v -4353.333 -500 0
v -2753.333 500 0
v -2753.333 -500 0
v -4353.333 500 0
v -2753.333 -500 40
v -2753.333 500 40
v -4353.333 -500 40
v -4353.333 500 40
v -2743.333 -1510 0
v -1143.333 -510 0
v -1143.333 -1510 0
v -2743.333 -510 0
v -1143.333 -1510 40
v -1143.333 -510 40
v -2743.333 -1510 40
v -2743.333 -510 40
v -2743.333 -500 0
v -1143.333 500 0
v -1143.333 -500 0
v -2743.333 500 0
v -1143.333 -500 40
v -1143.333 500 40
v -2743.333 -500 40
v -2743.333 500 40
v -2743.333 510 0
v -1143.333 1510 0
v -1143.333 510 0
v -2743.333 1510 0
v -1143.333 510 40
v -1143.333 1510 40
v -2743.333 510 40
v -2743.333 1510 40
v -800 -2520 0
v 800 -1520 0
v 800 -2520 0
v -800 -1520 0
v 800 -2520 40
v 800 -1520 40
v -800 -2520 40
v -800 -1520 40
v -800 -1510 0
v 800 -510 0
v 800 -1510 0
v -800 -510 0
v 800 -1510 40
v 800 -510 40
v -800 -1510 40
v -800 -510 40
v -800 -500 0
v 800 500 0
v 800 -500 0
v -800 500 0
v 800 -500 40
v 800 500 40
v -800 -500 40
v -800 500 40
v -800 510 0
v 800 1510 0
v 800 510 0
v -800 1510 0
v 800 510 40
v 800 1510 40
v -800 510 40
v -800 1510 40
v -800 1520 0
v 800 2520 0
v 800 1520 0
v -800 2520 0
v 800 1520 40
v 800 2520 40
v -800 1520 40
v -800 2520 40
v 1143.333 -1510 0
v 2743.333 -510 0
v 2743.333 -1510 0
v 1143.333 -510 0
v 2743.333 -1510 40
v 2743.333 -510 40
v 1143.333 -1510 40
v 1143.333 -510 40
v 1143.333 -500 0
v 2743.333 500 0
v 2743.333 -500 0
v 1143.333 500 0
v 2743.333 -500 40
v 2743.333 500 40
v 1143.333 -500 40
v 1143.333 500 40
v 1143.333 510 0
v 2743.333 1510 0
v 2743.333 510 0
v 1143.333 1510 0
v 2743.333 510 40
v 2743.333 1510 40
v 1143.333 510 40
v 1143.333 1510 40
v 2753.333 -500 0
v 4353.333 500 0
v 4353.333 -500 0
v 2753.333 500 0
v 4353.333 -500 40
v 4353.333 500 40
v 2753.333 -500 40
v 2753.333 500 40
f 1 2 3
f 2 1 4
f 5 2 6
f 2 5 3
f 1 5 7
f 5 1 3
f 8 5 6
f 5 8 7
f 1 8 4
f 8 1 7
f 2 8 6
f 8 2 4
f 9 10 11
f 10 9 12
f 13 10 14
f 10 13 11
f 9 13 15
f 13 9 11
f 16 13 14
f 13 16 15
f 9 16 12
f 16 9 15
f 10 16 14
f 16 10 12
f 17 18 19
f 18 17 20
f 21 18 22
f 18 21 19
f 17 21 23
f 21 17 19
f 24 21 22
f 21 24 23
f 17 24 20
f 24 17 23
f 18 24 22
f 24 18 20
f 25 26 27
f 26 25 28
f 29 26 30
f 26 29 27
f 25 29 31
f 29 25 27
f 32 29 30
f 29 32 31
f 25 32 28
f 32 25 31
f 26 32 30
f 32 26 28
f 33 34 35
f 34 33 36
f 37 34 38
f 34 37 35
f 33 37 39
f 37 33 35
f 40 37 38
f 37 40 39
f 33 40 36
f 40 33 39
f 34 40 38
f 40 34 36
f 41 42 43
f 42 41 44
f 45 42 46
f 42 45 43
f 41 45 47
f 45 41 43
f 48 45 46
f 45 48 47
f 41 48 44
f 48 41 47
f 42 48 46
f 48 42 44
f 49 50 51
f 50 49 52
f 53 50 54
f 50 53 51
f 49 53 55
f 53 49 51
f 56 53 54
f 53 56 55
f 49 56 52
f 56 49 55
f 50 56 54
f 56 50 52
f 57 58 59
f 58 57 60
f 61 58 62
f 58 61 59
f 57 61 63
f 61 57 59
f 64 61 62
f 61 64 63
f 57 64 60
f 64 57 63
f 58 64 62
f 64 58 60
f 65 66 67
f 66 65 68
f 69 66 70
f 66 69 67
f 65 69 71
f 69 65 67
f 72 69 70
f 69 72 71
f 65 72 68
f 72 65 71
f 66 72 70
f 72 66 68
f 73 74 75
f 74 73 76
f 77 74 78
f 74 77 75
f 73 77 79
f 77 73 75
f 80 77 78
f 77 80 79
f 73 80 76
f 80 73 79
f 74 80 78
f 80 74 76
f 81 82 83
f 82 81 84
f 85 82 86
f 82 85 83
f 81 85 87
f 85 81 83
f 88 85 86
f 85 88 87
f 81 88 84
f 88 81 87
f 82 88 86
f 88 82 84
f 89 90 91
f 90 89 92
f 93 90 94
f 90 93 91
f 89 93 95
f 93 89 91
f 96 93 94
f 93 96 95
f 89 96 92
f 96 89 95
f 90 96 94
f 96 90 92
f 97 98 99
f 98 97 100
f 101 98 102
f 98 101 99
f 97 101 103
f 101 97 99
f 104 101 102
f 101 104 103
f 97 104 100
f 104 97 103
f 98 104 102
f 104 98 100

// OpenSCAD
// Generated by Parametrix
ca_surface_faceSurface_000 = [ [ -4353.3333, -500.0000 ],[ -2753.3333, -500.0000 ],[ -2753.3333, 500.0000 ],[ -4353.3333, 500.0000 ],[ -4353.3333, -500.0000 ] ];
cb_surface_faceSurface_000 = [  0, 1, 2, 3, 4 ];
ca_surface_faceSurface_001 = [ [ -2743.3333, -1510.0000 ],[ -1143.3333, -1510.0000 ],[ -1143.3333, -510.0000 ],[ -2743.3333, -510.0000 ],[ -2743.3333, -1510.0000 ] ];
cb_surface_faceSurface_001 = [  5, 6, 7, 8, 9 ];
ca_surface_faceSurface_002 = [ [ -2743.3333, -500.0000 ],[ -1143.3333, -500.0000 ],[ -1143.3333, 500.0000 ],[ -2743.3333, 500.0000 ],[ -2743.3333, -500.0000 ] ];
cb_surface_faceSurface_002 = [  10, 11, 12, 13, 14 ];
ca_surface_faceSurface_003 = [ [ -2743.3333, 510.0000 ],[ -1143.3333, 510.0000 ],[ -1143.3333, 1510.0000 ],[ -2743.3333, 1510.0000 ],[ -2743.3333, 510.0000 ] ];
cb_surface_faceSurface_003 = [  15, 16, 17, 18, 19 ];
ca_surface_faceSurface_004 = [ [ -800.0000, -2520.0000 ],[ 800.0000, -2520.0000 ],[ 800.0000, -1520.0000 ],[ -800.0000, -1520.0000 ],[ -800.0000, -2520.0000 ] ];
cb_surface_faceSurface_004 = [  20, 21, 22, 23, 24 ];
ca_surface_faceSurface_005 = [ [ -800.0000, -1510.0000 ],[ 800.0000, -1510.0000 ],[ 800.0000, -510.0000 ],[ -800.0000, -510.0000 ],[ -800.0000, -1510.0000 ] ];
cb_surface_faceSurface_005 = [  25, 26, 27, 28, 29 ];
ca_surface_faceSurface_006 = [ [ -800.0000, -500.0000 ],[ 800.0000, -500.0000 ],[ 800.0000, 500.0000 ],[ -800.0000, 500.0000 ],[ -800.0000, -500.0000 ] ];
cb_surface_faceSurface_006 = [  30, 31, 32, 33, 34 ];
ca_surface_faceSurface_007 = [ [ -800.0000, 510.0000 ],[ 800.0000, 510.0000 ],[ 800.0000, 1510.0000 ],[ -800.0000, 1510.0000 ],[ -800.0000, 510.0000 ] ];
cb_surface_faceSurface_007 = [  35, 36, 37, 38, 39 ];
ca_surface_faceSurface_008 = [ [ -800.0000, 1520.0000 ],[ 800.0000, 1520.0000 ],[ 800.0000, 2520.0000 ],[ -800.0000, 2520.0000 ],[ -800.0000, 1520.0000 ] ];
cb_surface_faceSurface_008 = [  40, 41, 42, 43, 44 ];
ca_surface_faceSurface_009 = [ [ 1143.3333, -1510.0000 ],[ 2743.3333, -1510.0000 ],[ 2743.3333, -510.0000 ],[ 1143.3333, -510.0000 ],[ 1143.3333, -1510.0000 ] ];
cb_surface_faceSurface_009 = [  45, 46, 47, 48, 49 ];
ca_surface_faceSurface_010 = [ [ 1143.3333, -500.0000 ],[ 2743.3333, -500.0000 ],[ 2743.3333, 500.0000 ],[ 1143.3333, 500.0000 ],[ 1143.3333, -500.0000 ] ];
cb_surface_faceSurface_010 = [  50, 51, 52, 53, 54 ];
ca_surface_faceSurface_011 = [ [ 1143.3333, 510.0000 ],[ 2743.3333, 510.0000 ],[ 2743.3333, 1510.0000 ],[ 1143.3333, 1510.0000 ],[ 1143.3333, 510.0000 ] ];
cb_surface_faceSurface_011 = [  55, 56, 57, 58, 59 ];
ca_surface_faceSurface_012 = [ [ 2753.3333, -500.0000 ],[ 4353.3333, -500.0000 ],[ 4353.3333, 500.0000 ],[ 2753.3333, 500.0000 ],[ 2753.3333, -500.0000 ] ];
cb_surface_faceSurface_012 = [  60, 61, 62, 63, 64 ];
a_surface_faceSurface = concat(ca_surface_faceSurface_000, ca_surface_faceSurface_001, ca_surface_faceSurface_002, ca_surface_faceSurface_003, ca_surface_faceSurface_004, ca_surface_faceSurface_005, ca_surface_faceSurface_006, ca_surface_faceSurface_007, ca_surface_faceSurface_008, ca_surface_faceSurface_009, ca_surface_faceSurface_010, ca_surface_faceSurface_011, ca_surface_faceSurface_012);
b_surface_faceSurface = [cb_surface_faceSurface_000, cb_surface_faceSurface_001, cb_surface_faceSurface_002, cb_surface_faceSurface_003, cb_surface_faceSurface_004, cb_surface_faceSurface_005, cb_surface_faceSurface_006, cb_surface_faceSurface_007, cb_surface_faceSurface_008, cb_surface_faceSurface_009, cb_surface_faceSurface_010, cb_surface_faceSurface_011, cb_surface_faceSurface_012];
ca_surface_faceOnePanel_000 = [ [ 0.0000, 0.0000 ],[ 1600.0000, 0.0000 ],[ 1600.0000, 1000.0000 ],[ 0.0000, 1000.0000 ],[ 0.0000, 0.0000 ] ];
cb_surface_faceOnePanel_000 = [  0, 1, 2, 3, 4 ];
a_surface_faceOnePanel = concat(ca_surface_faceOnePanel_000);
b_surface_faceOnePanel = [cb_surface_faceOnePanel_000];

module subpax_surface_panel_0 () {
	translate( [ -4353.333333333333, -500, 0 ])
		rotate( [ 0, 0, 0 ])
			   linear_extrude(height = 40) polygon(a_surface_faceOnePanel, b_surface_faceOnePanel);
}

module subpax_surface_panel_1 () {
	translate( [ -2743.333333333333, -1510, 0 ])
		rotate( [ 0, 0, 0 ])
			   linear_extrude(height = 40) polygon(a_surface_faceOnePanel, b_surface_faceOnePanel);
}

module subpax_surface_panel_2 () {
	translate( [ -2743.333333333333, -500, 0 ])
		rotate( [ 0, 0, 0 ])
			   linear_extrude(height = 40) polygon(a_surface_faceOnePanel, b_surface_faceOnePanel);
}

module subpax_surface_panel_3 () {
	translate( [ -2743.333333333333, 510, 0 ])
		rotate( [ 0, 0, 0 ])
			   linear_extrude(height = 40) polygon(a_surface_faceOnePanel, b_surface_faceOnePanel);
}

module subpax_surface_panel_4 () {
	translate( [ -799.9999999999998, -2520, 0 ])
		rotate( [ 0, 0, 0 ])
			   linear_extrude(height = 40) polygon(a_surface_faceOnePanel, b_surface_faceOnePanel);
}

module subpax_surface_panel_5 () {
	translate( [ -799.9999999999998, -1510, 0 ])
		rotate( [ 0, 0, 0 ])
			   linear_extrude(height = 40) polygon(a_surface_faceOnePanel, b_surface_faceOnePanel);
}

module subpax_surface_panel_6 () {
	translate( [ -799.9999999999998, -500, 0 ])
		rotate( [ 0, 0, 0 ])
			   linear_extrude(height = 40) polygon(a_surface_faceOnePanel, b_surface_faceOnePanel);
}

module subpax_surface_panel_7 () {
	translate( [ -799.9999999999998, 510, 0 ])
		rotate( [ 0, 0, 0 ])
			   linear_extrude(height = 40) polygon(a_surface_faceOnePanel, b_surface_faceOnePanel);
}

module subpax_surface_panel_8 () {
	translate( [ -799.9999999999998, 1520, 0 ])
		rotate( [ 0, 0, 0 ])
			   linear_extrude(height = 40) polygon(a_surface_faceOnePanel, b_surface_faceOnePanel);
}

module subpax_surface_panel_9 () {
	translate( [ 1143.3333333333337, -1510, 0 ])
		rotate( [ 0, 0, 0 ])
			   linear_extrude(height = 40) polygon(a_surface_faceOnePanel, b_surface_faceOnePanel);
}

module subpax_surface_panel_10 () {
	translate( [ 1143.3333333333337, -500, 0 ])
		rotate( [ 0, 0, 0 ])
			   linear_extrude(height = 40) polygon(a_surface_faceOnePanel, b_surface_faceOnePanel);
}

module subpax_surface_panel_11 () {
	translate( [ 1143.3333333333337, 510, 0 ])
		rotate( [ 0, 0, 0 ])
			   linear_extrude(height = 40) polygon(a_surface_faceOnePanel, b_surface_faceOnePanel);
}

module subpax_surface_panel_12 () {
	translate( [ 2753.333333333334, -500, 0 ])
		rotate( [ 0, 0, 0 ])
			   linear_extrude(height = 40) polygon(a_surface_faceOnePanel, b_surface_faceOnePanel);
}

module pax_surface () {
	union () {
		subpax_surface_panel_0();
subpax_surface_panel_1();
subpax_surface_panel_2();
subpax_surface_panel_3();
subpax_surface_panel_4();
subpax_surface_panel_5();
subpax_surface_panel_6();
subpax_surface_panel_7();
subpax_surface_panel_8();
subpax_surface_panel_9();
subpax_surface_panel_10();
subpax_surface_panel_11();
subpax_surface_panel_12();
	}
}

pax_surface();
